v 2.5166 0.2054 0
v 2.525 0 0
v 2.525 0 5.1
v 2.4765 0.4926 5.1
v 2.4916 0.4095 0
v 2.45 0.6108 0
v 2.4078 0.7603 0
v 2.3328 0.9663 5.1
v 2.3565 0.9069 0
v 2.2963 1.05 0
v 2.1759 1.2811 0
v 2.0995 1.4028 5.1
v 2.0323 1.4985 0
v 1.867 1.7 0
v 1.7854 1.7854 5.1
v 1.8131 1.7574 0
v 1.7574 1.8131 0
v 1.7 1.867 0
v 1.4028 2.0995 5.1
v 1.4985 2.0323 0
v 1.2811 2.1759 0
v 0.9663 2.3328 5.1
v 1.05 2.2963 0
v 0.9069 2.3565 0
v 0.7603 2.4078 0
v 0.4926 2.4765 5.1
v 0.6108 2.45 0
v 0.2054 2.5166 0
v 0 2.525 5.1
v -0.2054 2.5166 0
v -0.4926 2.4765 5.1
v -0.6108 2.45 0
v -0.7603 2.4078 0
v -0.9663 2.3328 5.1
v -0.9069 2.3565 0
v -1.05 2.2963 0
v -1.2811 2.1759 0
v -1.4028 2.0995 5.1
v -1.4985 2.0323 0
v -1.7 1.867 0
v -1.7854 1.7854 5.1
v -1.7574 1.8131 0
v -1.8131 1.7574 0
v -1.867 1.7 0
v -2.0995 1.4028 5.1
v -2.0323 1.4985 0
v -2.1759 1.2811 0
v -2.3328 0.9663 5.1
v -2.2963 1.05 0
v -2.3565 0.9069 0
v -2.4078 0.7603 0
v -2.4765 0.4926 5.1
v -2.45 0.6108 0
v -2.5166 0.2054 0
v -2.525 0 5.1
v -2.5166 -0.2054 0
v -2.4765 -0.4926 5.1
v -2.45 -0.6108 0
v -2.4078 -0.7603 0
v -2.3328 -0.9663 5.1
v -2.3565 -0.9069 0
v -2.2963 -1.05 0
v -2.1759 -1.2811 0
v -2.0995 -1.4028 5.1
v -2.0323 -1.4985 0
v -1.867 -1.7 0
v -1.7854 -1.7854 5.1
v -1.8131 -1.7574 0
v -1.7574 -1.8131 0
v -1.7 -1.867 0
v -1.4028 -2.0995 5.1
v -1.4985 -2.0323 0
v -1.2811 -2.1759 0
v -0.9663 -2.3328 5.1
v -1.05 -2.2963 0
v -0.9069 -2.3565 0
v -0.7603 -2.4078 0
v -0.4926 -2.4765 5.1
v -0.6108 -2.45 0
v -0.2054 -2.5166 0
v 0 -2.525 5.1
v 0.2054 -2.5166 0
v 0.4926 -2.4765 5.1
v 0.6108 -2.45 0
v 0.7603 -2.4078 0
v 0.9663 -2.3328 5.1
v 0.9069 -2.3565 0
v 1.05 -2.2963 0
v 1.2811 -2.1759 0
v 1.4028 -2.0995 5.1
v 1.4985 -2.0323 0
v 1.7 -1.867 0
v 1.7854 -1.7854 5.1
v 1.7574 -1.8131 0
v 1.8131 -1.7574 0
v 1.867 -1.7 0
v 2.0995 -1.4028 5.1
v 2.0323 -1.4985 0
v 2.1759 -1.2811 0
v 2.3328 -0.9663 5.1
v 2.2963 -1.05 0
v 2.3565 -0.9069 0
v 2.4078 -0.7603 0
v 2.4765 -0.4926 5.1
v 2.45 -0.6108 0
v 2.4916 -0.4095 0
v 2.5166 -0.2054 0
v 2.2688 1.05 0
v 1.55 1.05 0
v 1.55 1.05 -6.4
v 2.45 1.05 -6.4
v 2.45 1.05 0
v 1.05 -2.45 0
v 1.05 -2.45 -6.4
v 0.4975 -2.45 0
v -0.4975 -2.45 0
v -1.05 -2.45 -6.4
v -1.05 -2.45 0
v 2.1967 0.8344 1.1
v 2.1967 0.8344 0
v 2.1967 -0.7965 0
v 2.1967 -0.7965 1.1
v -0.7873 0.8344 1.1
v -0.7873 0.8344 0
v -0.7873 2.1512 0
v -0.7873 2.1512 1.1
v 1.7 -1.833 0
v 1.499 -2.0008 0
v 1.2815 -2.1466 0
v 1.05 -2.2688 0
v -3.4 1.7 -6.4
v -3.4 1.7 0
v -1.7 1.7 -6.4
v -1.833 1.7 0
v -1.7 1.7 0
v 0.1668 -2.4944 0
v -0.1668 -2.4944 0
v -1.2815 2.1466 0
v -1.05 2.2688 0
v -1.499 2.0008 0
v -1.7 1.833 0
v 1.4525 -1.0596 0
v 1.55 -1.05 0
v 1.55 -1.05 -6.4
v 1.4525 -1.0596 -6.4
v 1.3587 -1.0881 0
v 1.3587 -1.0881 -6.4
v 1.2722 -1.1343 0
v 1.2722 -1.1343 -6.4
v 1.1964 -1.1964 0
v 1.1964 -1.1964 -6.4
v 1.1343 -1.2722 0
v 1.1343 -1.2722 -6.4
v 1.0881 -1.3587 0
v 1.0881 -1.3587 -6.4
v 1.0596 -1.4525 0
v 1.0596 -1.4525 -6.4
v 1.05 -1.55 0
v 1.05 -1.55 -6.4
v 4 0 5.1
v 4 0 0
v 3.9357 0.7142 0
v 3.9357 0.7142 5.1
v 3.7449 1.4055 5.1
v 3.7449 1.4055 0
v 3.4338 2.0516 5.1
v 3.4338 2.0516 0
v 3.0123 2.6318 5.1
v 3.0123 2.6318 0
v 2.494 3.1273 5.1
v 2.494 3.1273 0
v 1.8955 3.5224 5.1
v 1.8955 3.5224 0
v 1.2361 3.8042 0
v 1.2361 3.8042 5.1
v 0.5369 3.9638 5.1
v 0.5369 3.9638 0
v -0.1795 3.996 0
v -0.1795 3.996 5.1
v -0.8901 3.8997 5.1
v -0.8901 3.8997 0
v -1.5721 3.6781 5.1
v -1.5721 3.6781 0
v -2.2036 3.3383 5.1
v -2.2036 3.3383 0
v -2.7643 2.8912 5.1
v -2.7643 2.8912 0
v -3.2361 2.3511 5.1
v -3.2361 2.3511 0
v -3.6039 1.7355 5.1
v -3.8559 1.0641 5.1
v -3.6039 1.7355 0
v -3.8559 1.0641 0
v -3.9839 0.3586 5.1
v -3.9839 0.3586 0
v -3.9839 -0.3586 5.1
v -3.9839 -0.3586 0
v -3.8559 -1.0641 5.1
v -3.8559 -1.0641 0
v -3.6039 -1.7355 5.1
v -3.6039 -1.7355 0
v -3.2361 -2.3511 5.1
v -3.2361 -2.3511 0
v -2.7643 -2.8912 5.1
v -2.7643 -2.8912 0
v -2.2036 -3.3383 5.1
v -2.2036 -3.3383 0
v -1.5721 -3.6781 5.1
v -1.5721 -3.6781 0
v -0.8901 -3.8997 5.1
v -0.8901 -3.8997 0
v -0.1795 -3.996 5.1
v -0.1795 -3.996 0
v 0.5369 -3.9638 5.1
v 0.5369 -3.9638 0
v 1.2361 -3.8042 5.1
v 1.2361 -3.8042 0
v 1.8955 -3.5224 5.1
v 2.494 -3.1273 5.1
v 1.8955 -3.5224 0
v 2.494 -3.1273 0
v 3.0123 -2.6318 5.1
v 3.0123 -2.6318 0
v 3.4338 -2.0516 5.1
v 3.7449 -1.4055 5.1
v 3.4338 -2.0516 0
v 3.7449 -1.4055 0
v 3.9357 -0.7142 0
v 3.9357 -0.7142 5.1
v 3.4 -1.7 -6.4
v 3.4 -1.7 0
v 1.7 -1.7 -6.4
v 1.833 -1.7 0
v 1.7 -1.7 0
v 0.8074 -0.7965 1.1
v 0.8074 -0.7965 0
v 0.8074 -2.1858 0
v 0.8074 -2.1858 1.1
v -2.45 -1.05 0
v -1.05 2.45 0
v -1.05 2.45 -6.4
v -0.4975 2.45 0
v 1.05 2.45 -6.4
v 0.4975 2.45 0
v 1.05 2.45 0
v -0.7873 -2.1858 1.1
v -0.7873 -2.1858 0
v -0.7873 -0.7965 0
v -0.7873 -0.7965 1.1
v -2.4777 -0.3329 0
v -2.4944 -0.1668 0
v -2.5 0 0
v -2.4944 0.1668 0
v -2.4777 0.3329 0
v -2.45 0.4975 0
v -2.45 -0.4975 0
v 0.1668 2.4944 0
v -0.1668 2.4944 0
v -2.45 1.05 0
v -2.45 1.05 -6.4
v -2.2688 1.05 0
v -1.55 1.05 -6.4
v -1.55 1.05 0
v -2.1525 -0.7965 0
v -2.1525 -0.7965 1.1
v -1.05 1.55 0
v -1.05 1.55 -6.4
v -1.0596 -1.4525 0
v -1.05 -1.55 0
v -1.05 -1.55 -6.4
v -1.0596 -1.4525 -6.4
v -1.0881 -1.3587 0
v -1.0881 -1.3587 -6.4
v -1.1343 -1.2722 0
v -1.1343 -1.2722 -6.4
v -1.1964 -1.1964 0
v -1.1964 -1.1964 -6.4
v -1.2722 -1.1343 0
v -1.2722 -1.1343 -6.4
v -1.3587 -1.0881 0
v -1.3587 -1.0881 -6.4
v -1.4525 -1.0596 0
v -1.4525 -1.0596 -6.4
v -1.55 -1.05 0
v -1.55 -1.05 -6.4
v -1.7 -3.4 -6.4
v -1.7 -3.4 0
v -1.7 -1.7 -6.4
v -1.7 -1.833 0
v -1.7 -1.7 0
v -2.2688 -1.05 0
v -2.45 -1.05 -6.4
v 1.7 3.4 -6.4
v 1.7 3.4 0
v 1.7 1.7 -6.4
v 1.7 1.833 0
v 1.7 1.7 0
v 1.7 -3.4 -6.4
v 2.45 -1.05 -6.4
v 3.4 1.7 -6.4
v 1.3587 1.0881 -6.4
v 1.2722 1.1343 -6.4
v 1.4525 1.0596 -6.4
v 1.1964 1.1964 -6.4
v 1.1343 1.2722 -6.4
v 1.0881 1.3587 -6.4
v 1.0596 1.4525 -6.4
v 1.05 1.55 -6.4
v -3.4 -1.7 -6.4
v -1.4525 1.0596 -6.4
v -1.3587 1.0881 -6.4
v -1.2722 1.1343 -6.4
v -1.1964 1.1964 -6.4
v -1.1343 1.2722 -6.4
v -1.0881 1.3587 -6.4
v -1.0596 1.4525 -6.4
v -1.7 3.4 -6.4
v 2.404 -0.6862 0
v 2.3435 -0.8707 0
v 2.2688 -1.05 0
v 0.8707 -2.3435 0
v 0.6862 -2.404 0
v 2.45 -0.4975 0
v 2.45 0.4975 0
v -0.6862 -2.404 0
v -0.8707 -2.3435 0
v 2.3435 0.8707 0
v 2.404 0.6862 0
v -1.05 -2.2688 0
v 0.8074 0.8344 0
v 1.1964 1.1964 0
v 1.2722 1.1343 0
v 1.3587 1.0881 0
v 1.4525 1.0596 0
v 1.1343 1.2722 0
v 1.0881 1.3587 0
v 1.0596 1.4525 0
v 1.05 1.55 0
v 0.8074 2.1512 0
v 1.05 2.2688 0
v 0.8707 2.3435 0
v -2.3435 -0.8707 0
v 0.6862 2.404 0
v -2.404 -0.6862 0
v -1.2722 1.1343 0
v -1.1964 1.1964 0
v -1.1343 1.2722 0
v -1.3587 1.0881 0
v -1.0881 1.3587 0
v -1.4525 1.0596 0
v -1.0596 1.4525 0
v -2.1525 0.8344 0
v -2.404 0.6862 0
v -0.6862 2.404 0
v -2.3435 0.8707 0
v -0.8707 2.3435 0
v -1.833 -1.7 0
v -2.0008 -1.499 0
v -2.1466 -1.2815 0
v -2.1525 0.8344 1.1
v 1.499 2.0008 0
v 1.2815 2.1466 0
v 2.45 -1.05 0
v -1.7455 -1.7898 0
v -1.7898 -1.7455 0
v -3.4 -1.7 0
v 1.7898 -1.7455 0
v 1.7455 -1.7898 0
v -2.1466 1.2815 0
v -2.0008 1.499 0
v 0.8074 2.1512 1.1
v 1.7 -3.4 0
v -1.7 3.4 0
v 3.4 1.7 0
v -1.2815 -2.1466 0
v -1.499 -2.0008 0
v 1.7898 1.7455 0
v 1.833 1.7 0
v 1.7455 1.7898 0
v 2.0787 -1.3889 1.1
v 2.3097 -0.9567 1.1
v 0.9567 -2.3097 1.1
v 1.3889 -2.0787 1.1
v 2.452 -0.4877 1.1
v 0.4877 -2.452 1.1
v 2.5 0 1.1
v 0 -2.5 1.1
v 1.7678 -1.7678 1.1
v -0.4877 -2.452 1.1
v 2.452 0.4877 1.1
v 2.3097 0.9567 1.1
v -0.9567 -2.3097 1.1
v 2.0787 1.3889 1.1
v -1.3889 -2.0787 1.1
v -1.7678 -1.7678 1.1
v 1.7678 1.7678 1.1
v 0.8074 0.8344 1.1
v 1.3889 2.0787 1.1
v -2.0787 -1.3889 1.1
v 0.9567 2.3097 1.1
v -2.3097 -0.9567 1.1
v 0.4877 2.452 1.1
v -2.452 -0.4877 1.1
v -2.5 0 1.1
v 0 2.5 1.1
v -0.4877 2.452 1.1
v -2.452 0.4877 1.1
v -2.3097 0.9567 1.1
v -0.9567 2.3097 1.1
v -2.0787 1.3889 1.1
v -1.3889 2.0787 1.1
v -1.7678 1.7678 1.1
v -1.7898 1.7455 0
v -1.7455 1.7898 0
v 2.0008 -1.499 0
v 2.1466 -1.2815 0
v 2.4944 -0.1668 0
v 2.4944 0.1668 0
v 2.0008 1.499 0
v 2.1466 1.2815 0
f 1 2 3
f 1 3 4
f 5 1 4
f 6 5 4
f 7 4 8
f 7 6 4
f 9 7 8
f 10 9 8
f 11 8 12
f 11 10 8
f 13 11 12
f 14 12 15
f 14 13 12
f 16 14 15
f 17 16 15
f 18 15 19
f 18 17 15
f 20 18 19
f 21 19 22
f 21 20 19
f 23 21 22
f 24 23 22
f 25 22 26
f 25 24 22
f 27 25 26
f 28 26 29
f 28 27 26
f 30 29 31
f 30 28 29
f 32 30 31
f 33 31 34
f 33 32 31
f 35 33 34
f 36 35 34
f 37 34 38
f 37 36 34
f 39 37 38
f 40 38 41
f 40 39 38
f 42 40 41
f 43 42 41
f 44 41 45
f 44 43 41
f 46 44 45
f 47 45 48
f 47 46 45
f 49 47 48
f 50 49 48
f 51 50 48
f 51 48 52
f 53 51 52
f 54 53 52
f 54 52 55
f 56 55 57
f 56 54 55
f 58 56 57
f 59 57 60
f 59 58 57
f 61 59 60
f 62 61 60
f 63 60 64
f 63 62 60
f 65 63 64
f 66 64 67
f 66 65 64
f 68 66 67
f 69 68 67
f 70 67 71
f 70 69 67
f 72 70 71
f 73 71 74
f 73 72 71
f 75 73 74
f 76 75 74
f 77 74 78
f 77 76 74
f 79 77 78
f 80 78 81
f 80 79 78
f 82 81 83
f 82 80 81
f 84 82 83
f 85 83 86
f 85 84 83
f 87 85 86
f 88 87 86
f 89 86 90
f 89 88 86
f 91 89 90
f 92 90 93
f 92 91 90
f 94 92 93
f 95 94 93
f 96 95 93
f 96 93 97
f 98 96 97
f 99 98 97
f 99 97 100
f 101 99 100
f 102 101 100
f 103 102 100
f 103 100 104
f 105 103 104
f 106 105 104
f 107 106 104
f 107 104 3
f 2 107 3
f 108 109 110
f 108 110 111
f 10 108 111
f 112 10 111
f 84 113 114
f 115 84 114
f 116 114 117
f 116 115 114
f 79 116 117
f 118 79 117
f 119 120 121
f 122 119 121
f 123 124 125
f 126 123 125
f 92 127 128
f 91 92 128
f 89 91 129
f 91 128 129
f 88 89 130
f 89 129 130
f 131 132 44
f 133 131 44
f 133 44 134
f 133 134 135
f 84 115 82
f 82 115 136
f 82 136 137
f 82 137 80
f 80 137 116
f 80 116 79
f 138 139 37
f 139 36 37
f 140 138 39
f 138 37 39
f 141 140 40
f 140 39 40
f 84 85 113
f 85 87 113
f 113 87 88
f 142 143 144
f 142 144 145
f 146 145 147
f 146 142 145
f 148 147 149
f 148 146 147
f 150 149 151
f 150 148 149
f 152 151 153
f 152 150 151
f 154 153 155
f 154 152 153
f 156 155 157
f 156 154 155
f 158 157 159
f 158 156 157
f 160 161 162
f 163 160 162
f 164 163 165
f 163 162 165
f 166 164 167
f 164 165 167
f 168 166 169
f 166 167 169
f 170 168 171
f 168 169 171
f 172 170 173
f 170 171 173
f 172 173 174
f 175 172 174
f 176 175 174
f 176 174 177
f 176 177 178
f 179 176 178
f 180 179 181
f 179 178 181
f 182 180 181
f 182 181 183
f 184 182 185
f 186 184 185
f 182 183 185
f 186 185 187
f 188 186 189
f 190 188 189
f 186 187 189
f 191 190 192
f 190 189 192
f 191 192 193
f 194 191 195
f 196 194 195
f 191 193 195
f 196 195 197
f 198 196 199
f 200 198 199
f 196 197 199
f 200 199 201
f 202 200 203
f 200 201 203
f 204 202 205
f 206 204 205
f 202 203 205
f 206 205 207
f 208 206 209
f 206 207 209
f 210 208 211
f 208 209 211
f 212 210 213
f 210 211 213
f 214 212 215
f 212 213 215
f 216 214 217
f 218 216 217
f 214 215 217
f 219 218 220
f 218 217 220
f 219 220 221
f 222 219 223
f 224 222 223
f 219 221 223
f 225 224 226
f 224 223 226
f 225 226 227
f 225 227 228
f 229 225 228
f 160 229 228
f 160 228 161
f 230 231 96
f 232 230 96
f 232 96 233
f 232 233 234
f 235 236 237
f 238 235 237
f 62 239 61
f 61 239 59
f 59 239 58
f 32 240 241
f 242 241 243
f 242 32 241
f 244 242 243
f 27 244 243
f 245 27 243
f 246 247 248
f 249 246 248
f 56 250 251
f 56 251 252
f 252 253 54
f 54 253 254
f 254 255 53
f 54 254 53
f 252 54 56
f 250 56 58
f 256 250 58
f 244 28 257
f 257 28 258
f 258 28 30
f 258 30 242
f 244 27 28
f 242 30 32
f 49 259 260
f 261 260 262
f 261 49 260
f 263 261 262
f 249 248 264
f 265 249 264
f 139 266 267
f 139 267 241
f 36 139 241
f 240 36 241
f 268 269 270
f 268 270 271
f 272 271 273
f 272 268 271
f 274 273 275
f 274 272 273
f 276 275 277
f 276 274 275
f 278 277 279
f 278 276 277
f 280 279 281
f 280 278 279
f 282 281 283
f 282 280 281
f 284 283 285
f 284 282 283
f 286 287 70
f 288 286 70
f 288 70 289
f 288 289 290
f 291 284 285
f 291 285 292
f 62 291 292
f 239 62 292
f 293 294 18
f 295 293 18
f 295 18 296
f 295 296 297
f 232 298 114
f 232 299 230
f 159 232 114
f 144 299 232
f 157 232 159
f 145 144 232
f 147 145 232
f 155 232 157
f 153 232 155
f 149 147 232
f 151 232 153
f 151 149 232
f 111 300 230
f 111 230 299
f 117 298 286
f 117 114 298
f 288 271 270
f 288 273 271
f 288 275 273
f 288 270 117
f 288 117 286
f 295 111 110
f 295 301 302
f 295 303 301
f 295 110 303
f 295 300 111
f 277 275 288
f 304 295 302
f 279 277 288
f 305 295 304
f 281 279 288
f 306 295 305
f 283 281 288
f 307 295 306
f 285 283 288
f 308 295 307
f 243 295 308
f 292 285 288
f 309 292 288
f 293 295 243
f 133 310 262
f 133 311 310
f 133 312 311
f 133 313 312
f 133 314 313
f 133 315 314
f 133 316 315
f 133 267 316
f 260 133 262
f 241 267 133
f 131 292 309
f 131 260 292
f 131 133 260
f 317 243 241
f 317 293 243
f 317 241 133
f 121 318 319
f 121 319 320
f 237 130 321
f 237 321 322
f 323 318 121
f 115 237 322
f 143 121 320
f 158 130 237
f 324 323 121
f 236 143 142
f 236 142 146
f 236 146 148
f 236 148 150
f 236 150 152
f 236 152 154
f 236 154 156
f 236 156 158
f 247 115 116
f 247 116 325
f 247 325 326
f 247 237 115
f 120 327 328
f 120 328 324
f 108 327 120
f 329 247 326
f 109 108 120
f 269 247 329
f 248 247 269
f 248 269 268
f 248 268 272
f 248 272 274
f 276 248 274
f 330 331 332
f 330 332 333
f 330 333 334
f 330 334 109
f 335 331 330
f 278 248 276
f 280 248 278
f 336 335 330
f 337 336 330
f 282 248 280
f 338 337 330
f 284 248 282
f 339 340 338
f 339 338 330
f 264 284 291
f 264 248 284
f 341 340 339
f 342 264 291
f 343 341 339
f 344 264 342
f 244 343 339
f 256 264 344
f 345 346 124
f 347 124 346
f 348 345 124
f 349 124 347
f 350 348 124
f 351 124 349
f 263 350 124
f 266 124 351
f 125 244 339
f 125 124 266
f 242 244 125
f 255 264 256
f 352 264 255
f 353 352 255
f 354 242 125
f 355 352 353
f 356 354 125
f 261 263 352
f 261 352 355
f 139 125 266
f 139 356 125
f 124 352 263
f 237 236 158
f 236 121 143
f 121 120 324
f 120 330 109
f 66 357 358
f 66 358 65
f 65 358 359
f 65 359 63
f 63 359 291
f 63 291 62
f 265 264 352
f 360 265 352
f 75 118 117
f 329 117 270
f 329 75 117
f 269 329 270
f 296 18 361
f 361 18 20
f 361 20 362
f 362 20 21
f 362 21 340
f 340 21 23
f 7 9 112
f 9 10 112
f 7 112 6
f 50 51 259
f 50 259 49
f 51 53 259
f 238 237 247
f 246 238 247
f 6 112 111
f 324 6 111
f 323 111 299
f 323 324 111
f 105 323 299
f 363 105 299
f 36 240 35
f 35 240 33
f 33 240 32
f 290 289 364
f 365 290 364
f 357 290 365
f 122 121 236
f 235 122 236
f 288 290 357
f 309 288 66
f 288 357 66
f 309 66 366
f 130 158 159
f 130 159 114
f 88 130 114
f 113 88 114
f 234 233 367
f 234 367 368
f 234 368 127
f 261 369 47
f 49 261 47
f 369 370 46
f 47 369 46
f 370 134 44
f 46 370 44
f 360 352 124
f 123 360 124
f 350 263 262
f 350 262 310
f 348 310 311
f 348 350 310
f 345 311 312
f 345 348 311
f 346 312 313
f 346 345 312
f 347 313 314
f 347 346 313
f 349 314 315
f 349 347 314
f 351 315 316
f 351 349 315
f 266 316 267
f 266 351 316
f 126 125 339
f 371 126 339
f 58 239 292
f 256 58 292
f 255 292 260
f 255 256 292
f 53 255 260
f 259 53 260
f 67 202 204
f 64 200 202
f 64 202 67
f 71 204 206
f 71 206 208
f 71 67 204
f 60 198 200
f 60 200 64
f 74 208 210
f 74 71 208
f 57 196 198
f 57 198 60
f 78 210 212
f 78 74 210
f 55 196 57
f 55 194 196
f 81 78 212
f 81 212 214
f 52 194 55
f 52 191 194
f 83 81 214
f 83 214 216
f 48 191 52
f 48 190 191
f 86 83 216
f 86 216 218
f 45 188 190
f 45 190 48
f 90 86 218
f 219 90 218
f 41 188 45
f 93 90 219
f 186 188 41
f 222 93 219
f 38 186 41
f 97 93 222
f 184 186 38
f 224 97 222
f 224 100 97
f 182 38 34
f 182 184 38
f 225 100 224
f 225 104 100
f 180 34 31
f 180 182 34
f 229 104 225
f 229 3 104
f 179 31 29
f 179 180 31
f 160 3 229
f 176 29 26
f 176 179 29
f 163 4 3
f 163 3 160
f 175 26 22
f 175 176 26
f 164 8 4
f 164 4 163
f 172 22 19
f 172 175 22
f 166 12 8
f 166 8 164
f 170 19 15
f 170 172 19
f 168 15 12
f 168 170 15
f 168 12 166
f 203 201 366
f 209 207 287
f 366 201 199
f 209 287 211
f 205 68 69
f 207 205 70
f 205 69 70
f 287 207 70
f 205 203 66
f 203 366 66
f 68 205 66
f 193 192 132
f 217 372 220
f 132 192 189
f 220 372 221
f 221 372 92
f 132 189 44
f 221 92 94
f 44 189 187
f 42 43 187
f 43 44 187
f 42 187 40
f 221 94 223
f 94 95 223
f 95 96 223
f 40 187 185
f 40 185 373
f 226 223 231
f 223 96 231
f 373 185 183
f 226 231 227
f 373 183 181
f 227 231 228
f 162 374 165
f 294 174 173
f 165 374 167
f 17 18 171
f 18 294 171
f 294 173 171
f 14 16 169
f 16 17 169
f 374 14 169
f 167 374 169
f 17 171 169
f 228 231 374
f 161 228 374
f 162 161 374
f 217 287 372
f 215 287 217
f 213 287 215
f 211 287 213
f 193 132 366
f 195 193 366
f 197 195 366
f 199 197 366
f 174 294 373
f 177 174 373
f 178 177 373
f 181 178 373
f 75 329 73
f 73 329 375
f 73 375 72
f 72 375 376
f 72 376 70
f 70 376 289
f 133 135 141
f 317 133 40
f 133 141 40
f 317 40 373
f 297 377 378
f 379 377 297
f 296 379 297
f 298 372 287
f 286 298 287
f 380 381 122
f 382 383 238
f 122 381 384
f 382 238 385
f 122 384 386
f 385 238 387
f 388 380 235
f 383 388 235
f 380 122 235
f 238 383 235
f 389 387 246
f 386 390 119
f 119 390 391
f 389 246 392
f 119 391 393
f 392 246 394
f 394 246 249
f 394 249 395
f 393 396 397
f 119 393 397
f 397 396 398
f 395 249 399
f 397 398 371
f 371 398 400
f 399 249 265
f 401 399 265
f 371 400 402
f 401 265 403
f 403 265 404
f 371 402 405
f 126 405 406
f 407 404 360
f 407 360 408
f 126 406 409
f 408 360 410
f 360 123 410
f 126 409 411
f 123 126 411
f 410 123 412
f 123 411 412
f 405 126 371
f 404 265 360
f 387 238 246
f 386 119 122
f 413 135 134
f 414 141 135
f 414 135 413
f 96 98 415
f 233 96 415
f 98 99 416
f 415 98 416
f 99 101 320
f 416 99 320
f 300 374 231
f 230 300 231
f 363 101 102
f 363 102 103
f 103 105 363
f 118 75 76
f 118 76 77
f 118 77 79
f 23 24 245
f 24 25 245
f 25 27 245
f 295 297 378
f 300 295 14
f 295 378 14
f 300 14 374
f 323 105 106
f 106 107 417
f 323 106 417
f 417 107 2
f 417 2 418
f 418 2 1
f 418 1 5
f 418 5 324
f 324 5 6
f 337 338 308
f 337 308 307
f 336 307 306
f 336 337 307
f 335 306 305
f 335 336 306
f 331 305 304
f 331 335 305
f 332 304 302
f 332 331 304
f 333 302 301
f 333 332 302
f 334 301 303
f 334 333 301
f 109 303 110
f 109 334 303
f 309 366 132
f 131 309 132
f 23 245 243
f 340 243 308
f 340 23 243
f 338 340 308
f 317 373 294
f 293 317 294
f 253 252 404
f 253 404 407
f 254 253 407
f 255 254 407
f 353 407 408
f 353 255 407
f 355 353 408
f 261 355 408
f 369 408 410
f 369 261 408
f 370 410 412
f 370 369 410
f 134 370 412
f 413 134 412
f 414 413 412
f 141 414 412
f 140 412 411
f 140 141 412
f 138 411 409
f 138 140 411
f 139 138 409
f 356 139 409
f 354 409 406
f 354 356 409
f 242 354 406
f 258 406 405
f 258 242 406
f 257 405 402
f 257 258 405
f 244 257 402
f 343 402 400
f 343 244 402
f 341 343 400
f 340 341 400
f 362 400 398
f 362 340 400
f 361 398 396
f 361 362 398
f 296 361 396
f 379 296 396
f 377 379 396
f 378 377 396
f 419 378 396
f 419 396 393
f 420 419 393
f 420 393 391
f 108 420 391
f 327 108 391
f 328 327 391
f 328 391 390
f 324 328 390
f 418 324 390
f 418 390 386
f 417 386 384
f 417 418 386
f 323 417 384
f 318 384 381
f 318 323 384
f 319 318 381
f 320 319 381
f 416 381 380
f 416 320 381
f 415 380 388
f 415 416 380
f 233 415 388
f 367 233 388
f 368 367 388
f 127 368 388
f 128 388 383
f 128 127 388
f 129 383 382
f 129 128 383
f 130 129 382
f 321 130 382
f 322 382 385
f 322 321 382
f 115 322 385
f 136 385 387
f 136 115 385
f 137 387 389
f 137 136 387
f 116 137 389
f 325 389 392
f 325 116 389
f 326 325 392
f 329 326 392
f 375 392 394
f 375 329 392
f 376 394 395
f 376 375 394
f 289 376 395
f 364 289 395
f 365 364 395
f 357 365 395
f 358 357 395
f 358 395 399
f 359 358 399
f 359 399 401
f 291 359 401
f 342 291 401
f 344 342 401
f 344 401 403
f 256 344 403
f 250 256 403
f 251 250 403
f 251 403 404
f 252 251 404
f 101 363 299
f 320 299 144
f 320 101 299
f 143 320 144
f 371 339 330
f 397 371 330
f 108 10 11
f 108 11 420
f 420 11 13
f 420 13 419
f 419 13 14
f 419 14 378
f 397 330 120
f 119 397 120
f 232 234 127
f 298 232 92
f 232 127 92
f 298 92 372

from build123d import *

# Parameters (mm, degrees)
SKETCH1_R           = 4
SKETCH1_R_2         = 2.525
BOSS_EXTRUDE1_DEPTH = 5.1
BOSS_EXTRUDE2_DEPTH = 6.4
SKETCH3_R           = 2.5
BOSS_EXTRUDE5_DEPTH = 1.1


with BuildPart() as part:
    # Sketch1 → Boss-Extrude1 (new body)
    with BuildSketch(Plane.XY):
        Circle(SKETCH1_R)
        Circle(SKETCH1_R_2, mode=Mode.SUBTRACT)
    extrude(amount=BOSS_EXTRUDE1_DEPTH)

    # Sketch2 → Boss-Extrude2 (add)
    with BuildSketch(Plane(origin=(0, 0, 0), x_dir=(-1, 0, 0), z_dir=(0, 0, -1))):
        Polygon((-1.7, 3.4), (-1.7, 1.7), (-3.4, 1.7), (-3.4, -1.7), (-1.7, -1.7), (-1.7, -3.4), (1.7, -3.4), (1.7, -1.7), (3.4, -1.7), (3.4, 1.7), (1.7, 1.7), (1.7, 3.4), align=None)
        with BuildLine():
            Line((-1.05, 2.45), (-1.05, 1.55))
            ThreePointArc((-1.05, 1.55), (-1.196446609, 1.196446609), (-1.55, 1.05))
            Line((-1.55, 1.05), (-2.45, 1.05))
            Line((-2.45, 1.05), (-2.45, -1.05))
            Line((-2.45, -1.05), (-1.55, -1.05))
            ThreePointArc((-1.55, -1.05), (-1.196446609, -1.196446609), (-1.05, -1.55))
            Line((-1.05, -1.55), (-1.05, -2.45))
            Line((-1.05, -2.45), (1.05, -2.45))
            Line((1.05, -2.45), (1.05, -1.55))
            ThreePointArc((1.05, -1.55), (1.196446609, -1.196446609), (1.55, -1.05))
            Line((1.55, -1.05), (2.45, -1.05))
            Line((2.45, -1.05), (2.45, 1.05))
            Line((2.45, 1.05), (1.55, 1.05))
            ThreePointArc((1.55, 1.05), (1.196446609, 1.196446609), (1.05, 1.55))
            Line((1.05, 1.55), (1.05, 2.45))
            Line((1.05, 2.45), (-1.05, 2.45))
        make_face(mode=Mode.SUBTRACT)
    extrude(amount=BOSS_EXTRUDE2_DEPTH)

    # Sketch3 → Boss-Extrude5 (add)
    with BuildSketch(Plane(origin=(0, 0, 0), x_dir=(-1, 0, 0), z_dir=(0, 0, -1))):
        Circle(SKETCH3_R)
        Polygon((-0.80736121, 2.151247078), (-0.80736121, 0.83443077), (-2.19666282, 0.83443077), (-2.19666282, -0.796488511), (-0.80736121, -0.796488511), (-0.80736121, -2.18579012), (0.78731542, -2.18579012), (0.78731542, -0.796488511), (2.152455262, -0.796488511), (2.152455262, 0.83443077), (0.78731542, 0.83443077), (0.78731542, 2.151247078), align=None, mode=Mode.SUBTRACT)
    extrude(amount=-BOSS_EXTRUDE5_DEPTH)


solid = part.part
